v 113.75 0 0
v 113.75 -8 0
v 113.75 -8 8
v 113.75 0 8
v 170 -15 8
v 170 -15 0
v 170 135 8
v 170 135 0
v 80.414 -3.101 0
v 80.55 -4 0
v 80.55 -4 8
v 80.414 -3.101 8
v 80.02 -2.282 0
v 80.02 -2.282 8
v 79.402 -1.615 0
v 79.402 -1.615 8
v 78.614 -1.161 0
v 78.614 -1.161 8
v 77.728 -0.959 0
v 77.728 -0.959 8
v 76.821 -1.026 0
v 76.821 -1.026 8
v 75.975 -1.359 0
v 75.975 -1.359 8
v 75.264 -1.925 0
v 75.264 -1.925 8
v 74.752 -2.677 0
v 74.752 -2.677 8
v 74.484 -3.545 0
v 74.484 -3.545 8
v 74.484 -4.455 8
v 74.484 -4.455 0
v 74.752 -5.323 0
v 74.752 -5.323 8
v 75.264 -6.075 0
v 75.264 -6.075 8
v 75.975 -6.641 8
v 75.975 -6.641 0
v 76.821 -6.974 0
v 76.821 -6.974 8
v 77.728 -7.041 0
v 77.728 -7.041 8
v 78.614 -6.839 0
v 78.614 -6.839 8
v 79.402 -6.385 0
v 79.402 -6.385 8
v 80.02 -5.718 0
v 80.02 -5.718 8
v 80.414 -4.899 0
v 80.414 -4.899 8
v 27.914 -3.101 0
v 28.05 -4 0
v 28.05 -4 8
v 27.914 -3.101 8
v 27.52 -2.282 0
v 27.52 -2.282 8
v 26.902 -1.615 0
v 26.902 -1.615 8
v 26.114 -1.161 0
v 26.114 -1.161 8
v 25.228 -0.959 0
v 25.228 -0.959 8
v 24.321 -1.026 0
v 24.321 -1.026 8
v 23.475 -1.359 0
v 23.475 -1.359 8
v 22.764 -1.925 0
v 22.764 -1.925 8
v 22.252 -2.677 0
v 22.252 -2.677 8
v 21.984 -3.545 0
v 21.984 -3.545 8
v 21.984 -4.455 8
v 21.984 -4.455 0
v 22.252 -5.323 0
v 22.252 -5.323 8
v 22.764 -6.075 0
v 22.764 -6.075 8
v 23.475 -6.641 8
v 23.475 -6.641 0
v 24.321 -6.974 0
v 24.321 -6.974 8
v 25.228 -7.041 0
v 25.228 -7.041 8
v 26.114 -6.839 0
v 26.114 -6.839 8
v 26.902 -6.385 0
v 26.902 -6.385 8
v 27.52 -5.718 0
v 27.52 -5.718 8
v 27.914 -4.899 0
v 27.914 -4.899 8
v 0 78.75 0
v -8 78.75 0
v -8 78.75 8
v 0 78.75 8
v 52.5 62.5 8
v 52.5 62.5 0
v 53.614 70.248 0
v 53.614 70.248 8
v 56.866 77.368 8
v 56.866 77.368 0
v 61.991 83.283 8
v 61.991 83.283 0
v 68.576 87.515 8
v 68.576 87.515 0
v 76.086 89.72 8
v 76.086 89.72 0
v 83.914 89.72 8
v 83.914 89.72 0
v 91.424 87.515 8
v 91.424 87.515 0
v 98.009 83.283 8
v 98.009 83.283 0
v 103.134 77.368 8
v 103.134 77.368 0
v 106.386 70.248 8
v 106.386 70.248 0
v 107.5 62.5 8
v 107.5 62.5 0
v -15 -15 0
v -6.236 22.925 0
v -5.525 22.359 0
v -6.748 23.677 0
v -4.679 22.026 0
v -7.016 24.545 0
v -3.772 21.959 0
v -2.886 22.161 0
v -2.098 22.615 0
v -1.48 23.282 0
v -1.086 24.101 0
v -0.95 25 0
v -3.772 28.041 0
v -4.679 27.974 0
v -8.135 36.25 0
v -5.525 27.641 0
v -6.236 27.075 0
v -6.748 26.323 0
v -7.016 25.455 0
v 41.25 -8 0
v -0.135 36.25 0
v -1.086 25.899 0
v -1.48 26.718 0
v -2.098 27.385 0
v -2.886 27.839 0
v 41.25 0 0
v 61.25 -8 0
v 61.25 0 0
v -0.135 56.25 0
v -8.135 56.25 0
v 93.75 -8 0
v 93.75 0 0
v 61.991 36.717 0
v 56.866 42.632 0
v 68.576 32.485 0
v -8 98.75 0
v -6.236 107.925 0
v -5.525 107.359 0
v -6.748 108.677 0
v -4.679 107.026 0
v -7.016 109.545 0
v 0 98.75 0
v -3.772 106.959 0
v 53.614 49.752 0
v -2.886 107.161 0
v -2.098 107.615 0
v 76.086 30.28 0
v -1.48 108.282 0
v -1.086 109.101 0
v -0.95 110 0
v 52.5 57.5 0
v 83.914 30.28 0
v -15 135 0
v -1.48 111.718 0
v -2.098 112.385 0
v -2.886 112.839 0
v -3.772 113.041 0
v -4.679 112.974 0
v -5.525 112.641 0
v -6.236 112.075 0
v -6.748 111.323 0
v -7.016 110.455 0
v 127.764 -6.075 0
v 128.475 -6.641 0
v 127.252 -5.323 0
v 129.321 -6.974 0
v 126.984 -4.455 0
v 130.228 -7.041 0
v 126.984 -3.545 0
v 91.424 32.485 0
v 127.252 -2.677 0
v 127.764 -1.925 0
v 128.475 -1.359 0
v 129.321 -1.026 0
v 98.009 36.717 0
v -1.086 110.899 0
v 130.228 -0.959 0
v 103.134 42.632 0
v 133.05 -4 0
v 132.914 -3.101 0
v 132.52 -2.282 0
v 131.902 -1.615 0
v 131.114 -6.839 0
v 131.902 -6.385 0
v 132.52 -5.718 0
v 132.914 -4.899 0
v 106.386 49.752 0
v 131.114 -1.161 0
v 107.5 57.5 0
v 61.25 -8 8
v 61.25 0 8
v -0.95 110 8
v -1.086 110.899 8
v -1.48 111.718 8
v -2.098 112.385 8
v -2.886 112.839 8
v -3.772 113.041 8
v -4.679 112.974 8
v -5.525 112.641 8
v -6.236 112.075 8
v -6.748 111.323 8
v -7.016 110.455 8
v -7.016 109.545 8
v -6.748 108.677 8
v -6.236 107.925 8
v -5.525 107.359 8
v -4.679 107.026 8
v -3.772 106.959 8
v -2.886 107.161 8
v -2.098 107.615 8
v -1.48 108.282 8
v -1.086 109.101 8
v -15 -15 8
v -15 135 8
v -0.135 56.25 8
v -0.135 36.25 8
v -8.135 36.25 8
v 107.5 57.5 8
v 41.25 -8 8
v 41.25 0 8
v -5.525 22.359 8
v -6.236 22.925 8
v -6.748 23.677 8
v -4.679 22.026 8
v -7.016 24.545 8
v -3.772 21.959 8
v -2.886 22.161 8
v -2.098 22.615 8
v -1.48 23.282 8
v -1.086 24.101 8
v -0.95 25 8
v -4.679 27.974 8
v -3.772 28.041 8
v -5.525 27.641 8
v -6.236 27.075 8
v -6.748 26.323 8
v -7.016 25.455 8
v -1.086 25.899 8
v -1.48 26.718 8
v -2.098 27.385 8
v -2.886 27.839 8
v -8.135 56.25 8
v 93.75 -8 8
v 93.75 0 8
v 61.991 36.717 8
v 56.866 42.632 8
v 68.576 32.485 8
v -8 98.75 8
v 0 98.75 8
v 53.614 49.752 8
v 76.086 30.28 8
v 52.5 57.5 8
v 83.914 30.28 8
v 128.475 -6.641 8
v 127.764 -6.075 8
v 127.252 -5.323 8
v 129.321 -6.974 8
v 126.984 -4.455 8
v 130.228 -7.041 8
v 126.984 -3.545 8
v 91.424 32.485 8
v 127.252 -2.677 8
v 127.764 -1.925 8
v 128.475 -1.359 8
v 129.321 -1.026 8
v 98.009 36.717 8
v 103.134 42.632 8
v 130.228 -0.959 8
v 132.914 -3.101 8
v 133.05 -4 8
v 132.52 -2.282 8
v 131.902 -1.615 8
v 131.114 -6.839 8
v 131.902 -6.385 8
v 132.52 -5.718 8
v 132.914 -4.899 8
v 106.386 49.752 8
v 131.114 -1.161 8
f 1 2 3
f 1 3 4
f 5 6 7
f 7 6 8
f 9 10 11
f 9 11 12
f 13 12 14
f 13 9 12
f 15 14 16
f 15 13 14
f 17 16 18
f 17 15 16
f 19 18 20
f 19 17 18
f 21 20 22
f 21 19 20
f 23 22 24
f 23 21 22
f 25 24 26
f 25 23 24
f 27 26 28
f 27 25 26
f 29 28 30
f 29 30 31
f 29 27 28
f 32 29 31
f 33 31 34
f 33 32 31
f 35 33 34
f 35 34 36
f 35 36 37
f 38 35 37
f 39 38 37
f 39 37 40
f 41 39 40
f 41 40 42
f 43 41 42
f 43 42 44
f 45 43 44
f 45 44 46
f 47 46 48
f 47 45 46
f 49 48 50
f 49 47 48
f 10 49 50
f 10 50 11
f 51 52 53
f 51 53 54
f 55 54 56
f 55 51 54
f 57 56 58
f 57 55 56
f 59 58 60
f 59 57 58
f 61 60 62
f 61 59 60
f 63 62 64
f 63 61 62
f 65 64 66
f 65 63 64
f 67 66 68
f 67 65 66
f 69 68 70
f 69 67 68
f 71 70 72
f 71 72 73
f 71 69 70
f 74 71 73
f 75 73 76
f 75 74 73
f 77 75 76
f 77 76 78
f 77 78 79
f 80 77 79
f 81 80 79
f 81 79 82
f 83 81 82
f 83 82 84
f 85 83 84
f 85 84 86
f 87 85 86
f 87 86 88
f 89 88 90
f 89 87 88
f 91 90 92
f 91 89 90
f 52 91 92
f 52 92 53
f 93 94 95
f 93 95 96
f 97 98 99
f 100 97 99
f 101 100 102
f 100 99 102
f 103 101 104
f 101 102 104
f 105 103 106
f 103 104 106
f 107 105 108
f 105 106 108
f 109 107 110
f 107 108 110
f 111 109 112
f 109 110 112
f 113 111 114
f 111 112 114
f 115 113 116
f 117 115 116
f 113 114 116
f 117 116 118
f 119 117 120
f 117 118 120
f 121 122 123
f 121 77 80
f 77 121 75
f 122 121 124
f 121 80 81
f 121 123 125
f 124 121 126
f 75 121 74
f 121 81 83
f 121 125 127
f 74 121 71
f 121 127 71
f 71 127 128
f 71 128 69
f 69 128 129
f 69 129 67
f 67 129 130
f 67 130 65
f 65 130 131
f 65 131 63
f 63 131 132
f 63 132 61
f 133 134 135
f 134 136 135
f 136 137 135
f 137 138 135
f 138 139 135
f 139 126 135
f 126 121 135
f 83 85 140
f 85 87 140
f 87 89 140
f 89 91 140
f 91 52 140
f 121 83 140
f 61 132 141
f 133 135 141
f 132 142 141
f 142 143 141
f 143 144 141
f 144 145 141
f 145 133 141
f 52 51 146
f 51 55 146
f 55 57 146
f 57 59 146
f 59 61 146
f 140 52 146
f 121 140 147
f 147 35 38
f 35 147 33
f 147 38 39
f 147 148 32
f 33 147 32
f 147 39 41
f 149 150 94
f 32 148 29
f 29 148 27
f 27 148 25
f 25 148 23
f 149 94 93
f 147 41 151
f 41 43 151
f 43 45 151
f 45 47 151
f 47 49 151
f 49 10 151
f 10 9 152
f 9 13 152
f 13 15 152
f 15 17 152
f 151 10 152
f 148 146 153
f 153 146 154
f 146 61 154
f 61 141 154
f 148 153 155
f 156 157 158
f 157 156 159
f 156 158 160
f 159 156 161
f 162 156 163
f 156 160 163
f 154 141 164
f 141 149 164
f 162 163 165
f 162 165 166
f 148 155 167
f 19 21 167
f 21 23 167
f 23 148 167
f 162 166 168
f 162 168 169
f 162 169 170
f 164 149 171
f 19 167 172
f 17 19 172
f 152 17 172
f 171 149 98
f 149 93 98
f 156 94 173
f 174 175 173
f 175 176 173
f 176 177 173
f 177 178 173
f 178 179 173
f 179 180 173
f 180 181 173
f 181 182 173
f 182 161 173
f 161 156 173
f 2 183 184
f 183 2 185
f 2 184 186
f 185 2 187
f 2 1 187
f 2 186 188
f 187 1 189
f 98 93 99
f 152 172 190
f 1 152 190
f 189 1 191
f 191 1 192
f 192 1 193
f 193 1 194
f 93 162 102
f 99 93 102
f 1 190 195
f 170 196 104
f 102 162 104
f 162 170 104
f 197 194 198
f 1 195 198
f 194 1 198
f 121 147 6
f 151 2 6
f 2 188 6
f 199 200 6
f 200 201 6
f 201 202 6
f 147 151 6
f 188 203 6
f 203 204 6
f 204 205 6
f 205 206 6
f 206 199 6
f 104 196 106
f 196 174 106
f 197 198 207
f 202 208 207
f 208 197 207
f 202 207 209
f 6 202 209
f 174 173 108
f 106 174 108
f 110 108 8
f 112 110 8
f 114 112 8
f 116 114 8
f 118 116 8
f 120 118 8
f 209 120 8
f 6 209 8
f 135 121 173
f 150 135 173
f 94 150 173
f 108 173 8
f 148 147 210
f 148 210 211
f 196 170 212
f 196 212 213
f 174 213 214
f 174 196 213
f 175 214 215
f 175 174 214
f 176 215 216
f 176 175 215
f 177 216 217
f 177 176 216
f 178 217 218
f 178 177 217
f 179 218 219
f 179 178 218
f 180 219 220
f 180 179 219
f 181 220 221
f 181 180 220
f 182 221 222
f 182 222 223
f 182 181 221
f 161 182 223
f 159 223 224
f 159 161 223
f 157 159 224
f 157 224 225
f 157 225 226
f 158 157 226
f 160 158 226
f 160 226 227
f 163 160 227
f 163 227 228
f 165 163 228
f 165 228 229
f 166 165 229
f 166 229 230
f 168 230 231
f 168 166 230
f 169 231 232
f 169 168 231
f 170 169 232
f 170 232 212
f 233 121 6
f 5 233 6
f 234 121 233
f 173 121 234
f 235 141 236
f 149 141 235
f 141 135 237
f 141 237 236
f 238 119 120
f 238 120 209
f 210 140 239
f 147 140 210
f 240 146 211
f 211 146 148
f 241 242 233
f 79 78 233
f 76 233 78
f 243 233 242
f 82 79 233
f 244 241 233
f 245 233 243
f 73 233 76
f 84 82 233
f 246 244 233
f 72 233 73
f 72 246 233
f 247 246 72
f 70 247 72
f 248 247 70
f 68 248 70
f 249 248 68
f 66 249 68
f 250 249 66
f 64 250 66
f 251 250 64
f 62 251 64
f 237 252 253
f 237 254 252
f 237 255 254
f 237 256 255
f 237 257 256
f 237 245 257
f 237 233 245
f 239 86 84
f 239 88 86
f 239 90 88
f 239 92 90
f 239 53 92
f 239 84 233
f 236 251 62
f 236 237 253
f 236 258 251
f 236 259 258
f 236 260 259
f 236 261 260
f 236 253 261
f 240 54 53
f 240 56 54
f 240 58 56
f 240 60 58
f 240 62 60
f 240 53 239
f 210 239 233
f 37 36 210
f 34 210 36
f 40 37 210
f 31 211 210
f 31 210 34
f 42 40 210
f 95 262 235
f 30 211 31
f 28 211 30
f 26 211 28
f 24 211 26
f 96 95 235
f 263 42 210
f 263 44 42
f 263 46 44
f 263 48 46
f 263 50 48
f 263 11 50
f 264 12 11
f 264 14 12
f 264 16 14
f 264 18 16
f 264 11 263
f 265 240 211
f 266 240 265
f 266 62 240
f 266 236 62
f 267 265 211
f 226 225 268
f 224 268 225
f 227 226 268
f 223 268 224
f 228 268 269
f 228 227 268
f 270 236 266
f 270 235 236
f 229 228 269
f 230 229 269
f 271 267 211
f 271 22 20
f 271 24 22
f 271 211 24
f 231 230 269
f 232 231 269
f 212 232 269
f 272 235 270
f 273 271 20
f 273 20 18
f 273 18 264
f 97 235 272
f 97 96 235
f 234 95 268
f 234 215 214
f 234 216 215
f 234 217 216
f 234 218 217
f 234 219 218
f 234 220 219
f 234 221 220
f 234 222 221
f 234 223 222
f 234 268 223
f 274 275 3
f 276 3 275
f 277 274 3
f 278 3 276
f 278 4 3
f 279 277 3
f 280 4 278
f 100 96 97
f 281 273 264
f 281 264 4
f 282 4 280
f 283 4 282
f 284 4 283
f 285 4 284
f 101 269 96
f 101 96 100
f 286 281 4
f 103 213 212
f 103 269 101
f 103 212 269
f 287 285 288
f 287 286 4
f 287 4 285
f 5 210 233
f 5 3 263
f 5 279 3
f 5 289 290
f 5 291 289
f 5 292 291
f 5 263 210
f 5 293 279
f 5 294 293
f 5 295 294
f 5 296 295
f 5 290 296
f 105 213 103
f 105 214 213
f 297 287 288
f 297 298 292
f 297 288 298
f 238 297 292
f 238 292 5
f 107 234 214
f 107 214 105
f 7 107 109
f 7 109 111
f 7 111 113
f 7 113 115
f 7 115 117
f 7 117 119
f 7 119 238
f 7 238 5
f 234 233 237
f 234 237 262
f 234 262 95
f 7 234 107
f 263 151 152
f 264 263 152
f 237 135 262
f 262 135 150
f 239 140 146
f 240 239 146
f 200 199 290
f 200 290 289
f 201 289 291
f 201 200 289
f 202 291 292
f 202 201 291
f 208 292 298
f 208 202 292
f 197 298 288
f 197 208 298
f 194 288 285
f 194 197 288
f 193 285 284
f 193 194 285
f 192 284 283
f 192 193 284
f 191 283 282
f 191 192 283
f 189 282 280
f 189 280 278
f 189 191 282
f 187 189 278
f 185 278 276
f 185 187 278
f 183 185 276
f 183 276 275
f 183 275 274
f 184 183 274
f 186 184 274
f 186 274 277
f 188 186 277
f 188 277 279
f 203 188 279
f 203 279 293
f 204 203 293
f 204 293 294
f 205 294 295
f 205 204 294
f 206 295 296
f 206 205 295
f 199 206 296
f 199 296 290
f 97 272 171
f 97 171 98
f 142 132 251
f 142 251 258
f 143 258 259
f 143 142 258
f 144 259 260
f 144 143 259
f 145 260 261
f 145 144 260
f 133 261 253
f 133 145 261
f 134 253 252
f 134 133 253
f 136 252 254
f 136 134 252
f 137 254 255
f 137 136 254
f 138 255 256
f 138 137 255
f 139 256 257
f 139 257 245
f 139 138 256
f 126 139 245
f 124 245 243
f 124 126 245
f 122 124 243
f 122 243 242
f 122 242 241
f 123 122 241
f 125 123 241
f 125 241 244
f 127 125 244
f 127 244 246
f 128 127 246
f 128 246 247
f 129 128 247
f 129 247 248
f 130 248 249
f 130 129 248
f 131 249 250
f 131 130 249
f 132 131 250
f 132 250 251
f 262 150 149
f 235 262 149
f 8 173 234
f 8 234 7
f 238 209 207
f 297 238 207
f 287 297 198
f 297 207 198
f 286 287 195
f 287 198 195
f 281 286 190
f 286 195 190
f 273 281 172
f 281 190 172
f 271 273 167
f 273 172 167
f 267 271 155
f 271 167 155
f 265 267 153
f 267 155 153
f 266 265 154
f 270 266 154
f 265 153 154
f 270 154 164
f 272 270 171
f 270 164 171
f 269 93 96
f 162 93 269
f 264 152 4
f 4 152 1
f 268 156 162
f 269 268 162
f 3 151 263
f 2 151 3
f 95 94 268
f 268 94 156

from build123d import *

# Parameters (mm, degrees)
MODEL_W             = 185
MODEL_H             = 150
MODEL_R             = 3.05
MODEL_W_2           = 20
MODEL_H_2           = 8
MODEL_W_3           = 8
MODEL_H_3           = 20
BOSS_EXTRUDE1_DEPTH = 8


with BuildPart() as part:
    # Model → Boss-Extrude1 (new body)
    with BuildSketch(Plane.XY):
        with Locations((77.5, 60)):
            Rectangle(MODEL_W, MODEL_H)
        with Locations((130, -4)):
            Circle(MODEL_R, mode=Mode.SUBTRACT)
        with Locations((25, -4)):
            Circle(MODEL_R, mode=Mode.SUBTRACT)
        with Locations((-4, 25)):
            Circle(MODEL_R, mode=Mode.SUBTRACT)
        with Locations((-4, 110)):
            Circle(MODEL_R, mode=Mode.SUBTRACT)
        with Locations((77.5, -4)):
            Circle(MODEL_R, mode=Mode.SUBTRACT)
        with Locations((103.75, -4)):
            Rectangle(MODEL_W_2, MODEL_H_2, mode=Mode.SUBTRACT)
        with BuildLine():
            Line((52.5, 57.5), (52.5, 62.5))
            ThreePointArc((52.5, 62.5), (80, 90), (107.5, 62.5))
            Line((107.5, 62.5), (107.5, 57.5))
            ThreePointArc((107.5, 57.5), (80, 30), (52.5, 57.5))
        make_face(mode=Mode.SUBTRACT)
        with Locations((51.25, -4)):
            Rectangle(MODEL_W_2, MODEL_H_2, mode=Mode.SUBTRACT)
        with Locations((-4, 88.75)):
            Rectangle(MODEL_W_3, MODEL_H_3, mode=Mode.SUBTRACT)
        with Locations((-4.13466, 46.25)):
            Rectangle(MODEL_W_3, MODEL_H_3, mode=Mode.SUBTRACT)
    extrude(amount=BOSS_EXTRUDE1_DEPTH)


solid = part.part
